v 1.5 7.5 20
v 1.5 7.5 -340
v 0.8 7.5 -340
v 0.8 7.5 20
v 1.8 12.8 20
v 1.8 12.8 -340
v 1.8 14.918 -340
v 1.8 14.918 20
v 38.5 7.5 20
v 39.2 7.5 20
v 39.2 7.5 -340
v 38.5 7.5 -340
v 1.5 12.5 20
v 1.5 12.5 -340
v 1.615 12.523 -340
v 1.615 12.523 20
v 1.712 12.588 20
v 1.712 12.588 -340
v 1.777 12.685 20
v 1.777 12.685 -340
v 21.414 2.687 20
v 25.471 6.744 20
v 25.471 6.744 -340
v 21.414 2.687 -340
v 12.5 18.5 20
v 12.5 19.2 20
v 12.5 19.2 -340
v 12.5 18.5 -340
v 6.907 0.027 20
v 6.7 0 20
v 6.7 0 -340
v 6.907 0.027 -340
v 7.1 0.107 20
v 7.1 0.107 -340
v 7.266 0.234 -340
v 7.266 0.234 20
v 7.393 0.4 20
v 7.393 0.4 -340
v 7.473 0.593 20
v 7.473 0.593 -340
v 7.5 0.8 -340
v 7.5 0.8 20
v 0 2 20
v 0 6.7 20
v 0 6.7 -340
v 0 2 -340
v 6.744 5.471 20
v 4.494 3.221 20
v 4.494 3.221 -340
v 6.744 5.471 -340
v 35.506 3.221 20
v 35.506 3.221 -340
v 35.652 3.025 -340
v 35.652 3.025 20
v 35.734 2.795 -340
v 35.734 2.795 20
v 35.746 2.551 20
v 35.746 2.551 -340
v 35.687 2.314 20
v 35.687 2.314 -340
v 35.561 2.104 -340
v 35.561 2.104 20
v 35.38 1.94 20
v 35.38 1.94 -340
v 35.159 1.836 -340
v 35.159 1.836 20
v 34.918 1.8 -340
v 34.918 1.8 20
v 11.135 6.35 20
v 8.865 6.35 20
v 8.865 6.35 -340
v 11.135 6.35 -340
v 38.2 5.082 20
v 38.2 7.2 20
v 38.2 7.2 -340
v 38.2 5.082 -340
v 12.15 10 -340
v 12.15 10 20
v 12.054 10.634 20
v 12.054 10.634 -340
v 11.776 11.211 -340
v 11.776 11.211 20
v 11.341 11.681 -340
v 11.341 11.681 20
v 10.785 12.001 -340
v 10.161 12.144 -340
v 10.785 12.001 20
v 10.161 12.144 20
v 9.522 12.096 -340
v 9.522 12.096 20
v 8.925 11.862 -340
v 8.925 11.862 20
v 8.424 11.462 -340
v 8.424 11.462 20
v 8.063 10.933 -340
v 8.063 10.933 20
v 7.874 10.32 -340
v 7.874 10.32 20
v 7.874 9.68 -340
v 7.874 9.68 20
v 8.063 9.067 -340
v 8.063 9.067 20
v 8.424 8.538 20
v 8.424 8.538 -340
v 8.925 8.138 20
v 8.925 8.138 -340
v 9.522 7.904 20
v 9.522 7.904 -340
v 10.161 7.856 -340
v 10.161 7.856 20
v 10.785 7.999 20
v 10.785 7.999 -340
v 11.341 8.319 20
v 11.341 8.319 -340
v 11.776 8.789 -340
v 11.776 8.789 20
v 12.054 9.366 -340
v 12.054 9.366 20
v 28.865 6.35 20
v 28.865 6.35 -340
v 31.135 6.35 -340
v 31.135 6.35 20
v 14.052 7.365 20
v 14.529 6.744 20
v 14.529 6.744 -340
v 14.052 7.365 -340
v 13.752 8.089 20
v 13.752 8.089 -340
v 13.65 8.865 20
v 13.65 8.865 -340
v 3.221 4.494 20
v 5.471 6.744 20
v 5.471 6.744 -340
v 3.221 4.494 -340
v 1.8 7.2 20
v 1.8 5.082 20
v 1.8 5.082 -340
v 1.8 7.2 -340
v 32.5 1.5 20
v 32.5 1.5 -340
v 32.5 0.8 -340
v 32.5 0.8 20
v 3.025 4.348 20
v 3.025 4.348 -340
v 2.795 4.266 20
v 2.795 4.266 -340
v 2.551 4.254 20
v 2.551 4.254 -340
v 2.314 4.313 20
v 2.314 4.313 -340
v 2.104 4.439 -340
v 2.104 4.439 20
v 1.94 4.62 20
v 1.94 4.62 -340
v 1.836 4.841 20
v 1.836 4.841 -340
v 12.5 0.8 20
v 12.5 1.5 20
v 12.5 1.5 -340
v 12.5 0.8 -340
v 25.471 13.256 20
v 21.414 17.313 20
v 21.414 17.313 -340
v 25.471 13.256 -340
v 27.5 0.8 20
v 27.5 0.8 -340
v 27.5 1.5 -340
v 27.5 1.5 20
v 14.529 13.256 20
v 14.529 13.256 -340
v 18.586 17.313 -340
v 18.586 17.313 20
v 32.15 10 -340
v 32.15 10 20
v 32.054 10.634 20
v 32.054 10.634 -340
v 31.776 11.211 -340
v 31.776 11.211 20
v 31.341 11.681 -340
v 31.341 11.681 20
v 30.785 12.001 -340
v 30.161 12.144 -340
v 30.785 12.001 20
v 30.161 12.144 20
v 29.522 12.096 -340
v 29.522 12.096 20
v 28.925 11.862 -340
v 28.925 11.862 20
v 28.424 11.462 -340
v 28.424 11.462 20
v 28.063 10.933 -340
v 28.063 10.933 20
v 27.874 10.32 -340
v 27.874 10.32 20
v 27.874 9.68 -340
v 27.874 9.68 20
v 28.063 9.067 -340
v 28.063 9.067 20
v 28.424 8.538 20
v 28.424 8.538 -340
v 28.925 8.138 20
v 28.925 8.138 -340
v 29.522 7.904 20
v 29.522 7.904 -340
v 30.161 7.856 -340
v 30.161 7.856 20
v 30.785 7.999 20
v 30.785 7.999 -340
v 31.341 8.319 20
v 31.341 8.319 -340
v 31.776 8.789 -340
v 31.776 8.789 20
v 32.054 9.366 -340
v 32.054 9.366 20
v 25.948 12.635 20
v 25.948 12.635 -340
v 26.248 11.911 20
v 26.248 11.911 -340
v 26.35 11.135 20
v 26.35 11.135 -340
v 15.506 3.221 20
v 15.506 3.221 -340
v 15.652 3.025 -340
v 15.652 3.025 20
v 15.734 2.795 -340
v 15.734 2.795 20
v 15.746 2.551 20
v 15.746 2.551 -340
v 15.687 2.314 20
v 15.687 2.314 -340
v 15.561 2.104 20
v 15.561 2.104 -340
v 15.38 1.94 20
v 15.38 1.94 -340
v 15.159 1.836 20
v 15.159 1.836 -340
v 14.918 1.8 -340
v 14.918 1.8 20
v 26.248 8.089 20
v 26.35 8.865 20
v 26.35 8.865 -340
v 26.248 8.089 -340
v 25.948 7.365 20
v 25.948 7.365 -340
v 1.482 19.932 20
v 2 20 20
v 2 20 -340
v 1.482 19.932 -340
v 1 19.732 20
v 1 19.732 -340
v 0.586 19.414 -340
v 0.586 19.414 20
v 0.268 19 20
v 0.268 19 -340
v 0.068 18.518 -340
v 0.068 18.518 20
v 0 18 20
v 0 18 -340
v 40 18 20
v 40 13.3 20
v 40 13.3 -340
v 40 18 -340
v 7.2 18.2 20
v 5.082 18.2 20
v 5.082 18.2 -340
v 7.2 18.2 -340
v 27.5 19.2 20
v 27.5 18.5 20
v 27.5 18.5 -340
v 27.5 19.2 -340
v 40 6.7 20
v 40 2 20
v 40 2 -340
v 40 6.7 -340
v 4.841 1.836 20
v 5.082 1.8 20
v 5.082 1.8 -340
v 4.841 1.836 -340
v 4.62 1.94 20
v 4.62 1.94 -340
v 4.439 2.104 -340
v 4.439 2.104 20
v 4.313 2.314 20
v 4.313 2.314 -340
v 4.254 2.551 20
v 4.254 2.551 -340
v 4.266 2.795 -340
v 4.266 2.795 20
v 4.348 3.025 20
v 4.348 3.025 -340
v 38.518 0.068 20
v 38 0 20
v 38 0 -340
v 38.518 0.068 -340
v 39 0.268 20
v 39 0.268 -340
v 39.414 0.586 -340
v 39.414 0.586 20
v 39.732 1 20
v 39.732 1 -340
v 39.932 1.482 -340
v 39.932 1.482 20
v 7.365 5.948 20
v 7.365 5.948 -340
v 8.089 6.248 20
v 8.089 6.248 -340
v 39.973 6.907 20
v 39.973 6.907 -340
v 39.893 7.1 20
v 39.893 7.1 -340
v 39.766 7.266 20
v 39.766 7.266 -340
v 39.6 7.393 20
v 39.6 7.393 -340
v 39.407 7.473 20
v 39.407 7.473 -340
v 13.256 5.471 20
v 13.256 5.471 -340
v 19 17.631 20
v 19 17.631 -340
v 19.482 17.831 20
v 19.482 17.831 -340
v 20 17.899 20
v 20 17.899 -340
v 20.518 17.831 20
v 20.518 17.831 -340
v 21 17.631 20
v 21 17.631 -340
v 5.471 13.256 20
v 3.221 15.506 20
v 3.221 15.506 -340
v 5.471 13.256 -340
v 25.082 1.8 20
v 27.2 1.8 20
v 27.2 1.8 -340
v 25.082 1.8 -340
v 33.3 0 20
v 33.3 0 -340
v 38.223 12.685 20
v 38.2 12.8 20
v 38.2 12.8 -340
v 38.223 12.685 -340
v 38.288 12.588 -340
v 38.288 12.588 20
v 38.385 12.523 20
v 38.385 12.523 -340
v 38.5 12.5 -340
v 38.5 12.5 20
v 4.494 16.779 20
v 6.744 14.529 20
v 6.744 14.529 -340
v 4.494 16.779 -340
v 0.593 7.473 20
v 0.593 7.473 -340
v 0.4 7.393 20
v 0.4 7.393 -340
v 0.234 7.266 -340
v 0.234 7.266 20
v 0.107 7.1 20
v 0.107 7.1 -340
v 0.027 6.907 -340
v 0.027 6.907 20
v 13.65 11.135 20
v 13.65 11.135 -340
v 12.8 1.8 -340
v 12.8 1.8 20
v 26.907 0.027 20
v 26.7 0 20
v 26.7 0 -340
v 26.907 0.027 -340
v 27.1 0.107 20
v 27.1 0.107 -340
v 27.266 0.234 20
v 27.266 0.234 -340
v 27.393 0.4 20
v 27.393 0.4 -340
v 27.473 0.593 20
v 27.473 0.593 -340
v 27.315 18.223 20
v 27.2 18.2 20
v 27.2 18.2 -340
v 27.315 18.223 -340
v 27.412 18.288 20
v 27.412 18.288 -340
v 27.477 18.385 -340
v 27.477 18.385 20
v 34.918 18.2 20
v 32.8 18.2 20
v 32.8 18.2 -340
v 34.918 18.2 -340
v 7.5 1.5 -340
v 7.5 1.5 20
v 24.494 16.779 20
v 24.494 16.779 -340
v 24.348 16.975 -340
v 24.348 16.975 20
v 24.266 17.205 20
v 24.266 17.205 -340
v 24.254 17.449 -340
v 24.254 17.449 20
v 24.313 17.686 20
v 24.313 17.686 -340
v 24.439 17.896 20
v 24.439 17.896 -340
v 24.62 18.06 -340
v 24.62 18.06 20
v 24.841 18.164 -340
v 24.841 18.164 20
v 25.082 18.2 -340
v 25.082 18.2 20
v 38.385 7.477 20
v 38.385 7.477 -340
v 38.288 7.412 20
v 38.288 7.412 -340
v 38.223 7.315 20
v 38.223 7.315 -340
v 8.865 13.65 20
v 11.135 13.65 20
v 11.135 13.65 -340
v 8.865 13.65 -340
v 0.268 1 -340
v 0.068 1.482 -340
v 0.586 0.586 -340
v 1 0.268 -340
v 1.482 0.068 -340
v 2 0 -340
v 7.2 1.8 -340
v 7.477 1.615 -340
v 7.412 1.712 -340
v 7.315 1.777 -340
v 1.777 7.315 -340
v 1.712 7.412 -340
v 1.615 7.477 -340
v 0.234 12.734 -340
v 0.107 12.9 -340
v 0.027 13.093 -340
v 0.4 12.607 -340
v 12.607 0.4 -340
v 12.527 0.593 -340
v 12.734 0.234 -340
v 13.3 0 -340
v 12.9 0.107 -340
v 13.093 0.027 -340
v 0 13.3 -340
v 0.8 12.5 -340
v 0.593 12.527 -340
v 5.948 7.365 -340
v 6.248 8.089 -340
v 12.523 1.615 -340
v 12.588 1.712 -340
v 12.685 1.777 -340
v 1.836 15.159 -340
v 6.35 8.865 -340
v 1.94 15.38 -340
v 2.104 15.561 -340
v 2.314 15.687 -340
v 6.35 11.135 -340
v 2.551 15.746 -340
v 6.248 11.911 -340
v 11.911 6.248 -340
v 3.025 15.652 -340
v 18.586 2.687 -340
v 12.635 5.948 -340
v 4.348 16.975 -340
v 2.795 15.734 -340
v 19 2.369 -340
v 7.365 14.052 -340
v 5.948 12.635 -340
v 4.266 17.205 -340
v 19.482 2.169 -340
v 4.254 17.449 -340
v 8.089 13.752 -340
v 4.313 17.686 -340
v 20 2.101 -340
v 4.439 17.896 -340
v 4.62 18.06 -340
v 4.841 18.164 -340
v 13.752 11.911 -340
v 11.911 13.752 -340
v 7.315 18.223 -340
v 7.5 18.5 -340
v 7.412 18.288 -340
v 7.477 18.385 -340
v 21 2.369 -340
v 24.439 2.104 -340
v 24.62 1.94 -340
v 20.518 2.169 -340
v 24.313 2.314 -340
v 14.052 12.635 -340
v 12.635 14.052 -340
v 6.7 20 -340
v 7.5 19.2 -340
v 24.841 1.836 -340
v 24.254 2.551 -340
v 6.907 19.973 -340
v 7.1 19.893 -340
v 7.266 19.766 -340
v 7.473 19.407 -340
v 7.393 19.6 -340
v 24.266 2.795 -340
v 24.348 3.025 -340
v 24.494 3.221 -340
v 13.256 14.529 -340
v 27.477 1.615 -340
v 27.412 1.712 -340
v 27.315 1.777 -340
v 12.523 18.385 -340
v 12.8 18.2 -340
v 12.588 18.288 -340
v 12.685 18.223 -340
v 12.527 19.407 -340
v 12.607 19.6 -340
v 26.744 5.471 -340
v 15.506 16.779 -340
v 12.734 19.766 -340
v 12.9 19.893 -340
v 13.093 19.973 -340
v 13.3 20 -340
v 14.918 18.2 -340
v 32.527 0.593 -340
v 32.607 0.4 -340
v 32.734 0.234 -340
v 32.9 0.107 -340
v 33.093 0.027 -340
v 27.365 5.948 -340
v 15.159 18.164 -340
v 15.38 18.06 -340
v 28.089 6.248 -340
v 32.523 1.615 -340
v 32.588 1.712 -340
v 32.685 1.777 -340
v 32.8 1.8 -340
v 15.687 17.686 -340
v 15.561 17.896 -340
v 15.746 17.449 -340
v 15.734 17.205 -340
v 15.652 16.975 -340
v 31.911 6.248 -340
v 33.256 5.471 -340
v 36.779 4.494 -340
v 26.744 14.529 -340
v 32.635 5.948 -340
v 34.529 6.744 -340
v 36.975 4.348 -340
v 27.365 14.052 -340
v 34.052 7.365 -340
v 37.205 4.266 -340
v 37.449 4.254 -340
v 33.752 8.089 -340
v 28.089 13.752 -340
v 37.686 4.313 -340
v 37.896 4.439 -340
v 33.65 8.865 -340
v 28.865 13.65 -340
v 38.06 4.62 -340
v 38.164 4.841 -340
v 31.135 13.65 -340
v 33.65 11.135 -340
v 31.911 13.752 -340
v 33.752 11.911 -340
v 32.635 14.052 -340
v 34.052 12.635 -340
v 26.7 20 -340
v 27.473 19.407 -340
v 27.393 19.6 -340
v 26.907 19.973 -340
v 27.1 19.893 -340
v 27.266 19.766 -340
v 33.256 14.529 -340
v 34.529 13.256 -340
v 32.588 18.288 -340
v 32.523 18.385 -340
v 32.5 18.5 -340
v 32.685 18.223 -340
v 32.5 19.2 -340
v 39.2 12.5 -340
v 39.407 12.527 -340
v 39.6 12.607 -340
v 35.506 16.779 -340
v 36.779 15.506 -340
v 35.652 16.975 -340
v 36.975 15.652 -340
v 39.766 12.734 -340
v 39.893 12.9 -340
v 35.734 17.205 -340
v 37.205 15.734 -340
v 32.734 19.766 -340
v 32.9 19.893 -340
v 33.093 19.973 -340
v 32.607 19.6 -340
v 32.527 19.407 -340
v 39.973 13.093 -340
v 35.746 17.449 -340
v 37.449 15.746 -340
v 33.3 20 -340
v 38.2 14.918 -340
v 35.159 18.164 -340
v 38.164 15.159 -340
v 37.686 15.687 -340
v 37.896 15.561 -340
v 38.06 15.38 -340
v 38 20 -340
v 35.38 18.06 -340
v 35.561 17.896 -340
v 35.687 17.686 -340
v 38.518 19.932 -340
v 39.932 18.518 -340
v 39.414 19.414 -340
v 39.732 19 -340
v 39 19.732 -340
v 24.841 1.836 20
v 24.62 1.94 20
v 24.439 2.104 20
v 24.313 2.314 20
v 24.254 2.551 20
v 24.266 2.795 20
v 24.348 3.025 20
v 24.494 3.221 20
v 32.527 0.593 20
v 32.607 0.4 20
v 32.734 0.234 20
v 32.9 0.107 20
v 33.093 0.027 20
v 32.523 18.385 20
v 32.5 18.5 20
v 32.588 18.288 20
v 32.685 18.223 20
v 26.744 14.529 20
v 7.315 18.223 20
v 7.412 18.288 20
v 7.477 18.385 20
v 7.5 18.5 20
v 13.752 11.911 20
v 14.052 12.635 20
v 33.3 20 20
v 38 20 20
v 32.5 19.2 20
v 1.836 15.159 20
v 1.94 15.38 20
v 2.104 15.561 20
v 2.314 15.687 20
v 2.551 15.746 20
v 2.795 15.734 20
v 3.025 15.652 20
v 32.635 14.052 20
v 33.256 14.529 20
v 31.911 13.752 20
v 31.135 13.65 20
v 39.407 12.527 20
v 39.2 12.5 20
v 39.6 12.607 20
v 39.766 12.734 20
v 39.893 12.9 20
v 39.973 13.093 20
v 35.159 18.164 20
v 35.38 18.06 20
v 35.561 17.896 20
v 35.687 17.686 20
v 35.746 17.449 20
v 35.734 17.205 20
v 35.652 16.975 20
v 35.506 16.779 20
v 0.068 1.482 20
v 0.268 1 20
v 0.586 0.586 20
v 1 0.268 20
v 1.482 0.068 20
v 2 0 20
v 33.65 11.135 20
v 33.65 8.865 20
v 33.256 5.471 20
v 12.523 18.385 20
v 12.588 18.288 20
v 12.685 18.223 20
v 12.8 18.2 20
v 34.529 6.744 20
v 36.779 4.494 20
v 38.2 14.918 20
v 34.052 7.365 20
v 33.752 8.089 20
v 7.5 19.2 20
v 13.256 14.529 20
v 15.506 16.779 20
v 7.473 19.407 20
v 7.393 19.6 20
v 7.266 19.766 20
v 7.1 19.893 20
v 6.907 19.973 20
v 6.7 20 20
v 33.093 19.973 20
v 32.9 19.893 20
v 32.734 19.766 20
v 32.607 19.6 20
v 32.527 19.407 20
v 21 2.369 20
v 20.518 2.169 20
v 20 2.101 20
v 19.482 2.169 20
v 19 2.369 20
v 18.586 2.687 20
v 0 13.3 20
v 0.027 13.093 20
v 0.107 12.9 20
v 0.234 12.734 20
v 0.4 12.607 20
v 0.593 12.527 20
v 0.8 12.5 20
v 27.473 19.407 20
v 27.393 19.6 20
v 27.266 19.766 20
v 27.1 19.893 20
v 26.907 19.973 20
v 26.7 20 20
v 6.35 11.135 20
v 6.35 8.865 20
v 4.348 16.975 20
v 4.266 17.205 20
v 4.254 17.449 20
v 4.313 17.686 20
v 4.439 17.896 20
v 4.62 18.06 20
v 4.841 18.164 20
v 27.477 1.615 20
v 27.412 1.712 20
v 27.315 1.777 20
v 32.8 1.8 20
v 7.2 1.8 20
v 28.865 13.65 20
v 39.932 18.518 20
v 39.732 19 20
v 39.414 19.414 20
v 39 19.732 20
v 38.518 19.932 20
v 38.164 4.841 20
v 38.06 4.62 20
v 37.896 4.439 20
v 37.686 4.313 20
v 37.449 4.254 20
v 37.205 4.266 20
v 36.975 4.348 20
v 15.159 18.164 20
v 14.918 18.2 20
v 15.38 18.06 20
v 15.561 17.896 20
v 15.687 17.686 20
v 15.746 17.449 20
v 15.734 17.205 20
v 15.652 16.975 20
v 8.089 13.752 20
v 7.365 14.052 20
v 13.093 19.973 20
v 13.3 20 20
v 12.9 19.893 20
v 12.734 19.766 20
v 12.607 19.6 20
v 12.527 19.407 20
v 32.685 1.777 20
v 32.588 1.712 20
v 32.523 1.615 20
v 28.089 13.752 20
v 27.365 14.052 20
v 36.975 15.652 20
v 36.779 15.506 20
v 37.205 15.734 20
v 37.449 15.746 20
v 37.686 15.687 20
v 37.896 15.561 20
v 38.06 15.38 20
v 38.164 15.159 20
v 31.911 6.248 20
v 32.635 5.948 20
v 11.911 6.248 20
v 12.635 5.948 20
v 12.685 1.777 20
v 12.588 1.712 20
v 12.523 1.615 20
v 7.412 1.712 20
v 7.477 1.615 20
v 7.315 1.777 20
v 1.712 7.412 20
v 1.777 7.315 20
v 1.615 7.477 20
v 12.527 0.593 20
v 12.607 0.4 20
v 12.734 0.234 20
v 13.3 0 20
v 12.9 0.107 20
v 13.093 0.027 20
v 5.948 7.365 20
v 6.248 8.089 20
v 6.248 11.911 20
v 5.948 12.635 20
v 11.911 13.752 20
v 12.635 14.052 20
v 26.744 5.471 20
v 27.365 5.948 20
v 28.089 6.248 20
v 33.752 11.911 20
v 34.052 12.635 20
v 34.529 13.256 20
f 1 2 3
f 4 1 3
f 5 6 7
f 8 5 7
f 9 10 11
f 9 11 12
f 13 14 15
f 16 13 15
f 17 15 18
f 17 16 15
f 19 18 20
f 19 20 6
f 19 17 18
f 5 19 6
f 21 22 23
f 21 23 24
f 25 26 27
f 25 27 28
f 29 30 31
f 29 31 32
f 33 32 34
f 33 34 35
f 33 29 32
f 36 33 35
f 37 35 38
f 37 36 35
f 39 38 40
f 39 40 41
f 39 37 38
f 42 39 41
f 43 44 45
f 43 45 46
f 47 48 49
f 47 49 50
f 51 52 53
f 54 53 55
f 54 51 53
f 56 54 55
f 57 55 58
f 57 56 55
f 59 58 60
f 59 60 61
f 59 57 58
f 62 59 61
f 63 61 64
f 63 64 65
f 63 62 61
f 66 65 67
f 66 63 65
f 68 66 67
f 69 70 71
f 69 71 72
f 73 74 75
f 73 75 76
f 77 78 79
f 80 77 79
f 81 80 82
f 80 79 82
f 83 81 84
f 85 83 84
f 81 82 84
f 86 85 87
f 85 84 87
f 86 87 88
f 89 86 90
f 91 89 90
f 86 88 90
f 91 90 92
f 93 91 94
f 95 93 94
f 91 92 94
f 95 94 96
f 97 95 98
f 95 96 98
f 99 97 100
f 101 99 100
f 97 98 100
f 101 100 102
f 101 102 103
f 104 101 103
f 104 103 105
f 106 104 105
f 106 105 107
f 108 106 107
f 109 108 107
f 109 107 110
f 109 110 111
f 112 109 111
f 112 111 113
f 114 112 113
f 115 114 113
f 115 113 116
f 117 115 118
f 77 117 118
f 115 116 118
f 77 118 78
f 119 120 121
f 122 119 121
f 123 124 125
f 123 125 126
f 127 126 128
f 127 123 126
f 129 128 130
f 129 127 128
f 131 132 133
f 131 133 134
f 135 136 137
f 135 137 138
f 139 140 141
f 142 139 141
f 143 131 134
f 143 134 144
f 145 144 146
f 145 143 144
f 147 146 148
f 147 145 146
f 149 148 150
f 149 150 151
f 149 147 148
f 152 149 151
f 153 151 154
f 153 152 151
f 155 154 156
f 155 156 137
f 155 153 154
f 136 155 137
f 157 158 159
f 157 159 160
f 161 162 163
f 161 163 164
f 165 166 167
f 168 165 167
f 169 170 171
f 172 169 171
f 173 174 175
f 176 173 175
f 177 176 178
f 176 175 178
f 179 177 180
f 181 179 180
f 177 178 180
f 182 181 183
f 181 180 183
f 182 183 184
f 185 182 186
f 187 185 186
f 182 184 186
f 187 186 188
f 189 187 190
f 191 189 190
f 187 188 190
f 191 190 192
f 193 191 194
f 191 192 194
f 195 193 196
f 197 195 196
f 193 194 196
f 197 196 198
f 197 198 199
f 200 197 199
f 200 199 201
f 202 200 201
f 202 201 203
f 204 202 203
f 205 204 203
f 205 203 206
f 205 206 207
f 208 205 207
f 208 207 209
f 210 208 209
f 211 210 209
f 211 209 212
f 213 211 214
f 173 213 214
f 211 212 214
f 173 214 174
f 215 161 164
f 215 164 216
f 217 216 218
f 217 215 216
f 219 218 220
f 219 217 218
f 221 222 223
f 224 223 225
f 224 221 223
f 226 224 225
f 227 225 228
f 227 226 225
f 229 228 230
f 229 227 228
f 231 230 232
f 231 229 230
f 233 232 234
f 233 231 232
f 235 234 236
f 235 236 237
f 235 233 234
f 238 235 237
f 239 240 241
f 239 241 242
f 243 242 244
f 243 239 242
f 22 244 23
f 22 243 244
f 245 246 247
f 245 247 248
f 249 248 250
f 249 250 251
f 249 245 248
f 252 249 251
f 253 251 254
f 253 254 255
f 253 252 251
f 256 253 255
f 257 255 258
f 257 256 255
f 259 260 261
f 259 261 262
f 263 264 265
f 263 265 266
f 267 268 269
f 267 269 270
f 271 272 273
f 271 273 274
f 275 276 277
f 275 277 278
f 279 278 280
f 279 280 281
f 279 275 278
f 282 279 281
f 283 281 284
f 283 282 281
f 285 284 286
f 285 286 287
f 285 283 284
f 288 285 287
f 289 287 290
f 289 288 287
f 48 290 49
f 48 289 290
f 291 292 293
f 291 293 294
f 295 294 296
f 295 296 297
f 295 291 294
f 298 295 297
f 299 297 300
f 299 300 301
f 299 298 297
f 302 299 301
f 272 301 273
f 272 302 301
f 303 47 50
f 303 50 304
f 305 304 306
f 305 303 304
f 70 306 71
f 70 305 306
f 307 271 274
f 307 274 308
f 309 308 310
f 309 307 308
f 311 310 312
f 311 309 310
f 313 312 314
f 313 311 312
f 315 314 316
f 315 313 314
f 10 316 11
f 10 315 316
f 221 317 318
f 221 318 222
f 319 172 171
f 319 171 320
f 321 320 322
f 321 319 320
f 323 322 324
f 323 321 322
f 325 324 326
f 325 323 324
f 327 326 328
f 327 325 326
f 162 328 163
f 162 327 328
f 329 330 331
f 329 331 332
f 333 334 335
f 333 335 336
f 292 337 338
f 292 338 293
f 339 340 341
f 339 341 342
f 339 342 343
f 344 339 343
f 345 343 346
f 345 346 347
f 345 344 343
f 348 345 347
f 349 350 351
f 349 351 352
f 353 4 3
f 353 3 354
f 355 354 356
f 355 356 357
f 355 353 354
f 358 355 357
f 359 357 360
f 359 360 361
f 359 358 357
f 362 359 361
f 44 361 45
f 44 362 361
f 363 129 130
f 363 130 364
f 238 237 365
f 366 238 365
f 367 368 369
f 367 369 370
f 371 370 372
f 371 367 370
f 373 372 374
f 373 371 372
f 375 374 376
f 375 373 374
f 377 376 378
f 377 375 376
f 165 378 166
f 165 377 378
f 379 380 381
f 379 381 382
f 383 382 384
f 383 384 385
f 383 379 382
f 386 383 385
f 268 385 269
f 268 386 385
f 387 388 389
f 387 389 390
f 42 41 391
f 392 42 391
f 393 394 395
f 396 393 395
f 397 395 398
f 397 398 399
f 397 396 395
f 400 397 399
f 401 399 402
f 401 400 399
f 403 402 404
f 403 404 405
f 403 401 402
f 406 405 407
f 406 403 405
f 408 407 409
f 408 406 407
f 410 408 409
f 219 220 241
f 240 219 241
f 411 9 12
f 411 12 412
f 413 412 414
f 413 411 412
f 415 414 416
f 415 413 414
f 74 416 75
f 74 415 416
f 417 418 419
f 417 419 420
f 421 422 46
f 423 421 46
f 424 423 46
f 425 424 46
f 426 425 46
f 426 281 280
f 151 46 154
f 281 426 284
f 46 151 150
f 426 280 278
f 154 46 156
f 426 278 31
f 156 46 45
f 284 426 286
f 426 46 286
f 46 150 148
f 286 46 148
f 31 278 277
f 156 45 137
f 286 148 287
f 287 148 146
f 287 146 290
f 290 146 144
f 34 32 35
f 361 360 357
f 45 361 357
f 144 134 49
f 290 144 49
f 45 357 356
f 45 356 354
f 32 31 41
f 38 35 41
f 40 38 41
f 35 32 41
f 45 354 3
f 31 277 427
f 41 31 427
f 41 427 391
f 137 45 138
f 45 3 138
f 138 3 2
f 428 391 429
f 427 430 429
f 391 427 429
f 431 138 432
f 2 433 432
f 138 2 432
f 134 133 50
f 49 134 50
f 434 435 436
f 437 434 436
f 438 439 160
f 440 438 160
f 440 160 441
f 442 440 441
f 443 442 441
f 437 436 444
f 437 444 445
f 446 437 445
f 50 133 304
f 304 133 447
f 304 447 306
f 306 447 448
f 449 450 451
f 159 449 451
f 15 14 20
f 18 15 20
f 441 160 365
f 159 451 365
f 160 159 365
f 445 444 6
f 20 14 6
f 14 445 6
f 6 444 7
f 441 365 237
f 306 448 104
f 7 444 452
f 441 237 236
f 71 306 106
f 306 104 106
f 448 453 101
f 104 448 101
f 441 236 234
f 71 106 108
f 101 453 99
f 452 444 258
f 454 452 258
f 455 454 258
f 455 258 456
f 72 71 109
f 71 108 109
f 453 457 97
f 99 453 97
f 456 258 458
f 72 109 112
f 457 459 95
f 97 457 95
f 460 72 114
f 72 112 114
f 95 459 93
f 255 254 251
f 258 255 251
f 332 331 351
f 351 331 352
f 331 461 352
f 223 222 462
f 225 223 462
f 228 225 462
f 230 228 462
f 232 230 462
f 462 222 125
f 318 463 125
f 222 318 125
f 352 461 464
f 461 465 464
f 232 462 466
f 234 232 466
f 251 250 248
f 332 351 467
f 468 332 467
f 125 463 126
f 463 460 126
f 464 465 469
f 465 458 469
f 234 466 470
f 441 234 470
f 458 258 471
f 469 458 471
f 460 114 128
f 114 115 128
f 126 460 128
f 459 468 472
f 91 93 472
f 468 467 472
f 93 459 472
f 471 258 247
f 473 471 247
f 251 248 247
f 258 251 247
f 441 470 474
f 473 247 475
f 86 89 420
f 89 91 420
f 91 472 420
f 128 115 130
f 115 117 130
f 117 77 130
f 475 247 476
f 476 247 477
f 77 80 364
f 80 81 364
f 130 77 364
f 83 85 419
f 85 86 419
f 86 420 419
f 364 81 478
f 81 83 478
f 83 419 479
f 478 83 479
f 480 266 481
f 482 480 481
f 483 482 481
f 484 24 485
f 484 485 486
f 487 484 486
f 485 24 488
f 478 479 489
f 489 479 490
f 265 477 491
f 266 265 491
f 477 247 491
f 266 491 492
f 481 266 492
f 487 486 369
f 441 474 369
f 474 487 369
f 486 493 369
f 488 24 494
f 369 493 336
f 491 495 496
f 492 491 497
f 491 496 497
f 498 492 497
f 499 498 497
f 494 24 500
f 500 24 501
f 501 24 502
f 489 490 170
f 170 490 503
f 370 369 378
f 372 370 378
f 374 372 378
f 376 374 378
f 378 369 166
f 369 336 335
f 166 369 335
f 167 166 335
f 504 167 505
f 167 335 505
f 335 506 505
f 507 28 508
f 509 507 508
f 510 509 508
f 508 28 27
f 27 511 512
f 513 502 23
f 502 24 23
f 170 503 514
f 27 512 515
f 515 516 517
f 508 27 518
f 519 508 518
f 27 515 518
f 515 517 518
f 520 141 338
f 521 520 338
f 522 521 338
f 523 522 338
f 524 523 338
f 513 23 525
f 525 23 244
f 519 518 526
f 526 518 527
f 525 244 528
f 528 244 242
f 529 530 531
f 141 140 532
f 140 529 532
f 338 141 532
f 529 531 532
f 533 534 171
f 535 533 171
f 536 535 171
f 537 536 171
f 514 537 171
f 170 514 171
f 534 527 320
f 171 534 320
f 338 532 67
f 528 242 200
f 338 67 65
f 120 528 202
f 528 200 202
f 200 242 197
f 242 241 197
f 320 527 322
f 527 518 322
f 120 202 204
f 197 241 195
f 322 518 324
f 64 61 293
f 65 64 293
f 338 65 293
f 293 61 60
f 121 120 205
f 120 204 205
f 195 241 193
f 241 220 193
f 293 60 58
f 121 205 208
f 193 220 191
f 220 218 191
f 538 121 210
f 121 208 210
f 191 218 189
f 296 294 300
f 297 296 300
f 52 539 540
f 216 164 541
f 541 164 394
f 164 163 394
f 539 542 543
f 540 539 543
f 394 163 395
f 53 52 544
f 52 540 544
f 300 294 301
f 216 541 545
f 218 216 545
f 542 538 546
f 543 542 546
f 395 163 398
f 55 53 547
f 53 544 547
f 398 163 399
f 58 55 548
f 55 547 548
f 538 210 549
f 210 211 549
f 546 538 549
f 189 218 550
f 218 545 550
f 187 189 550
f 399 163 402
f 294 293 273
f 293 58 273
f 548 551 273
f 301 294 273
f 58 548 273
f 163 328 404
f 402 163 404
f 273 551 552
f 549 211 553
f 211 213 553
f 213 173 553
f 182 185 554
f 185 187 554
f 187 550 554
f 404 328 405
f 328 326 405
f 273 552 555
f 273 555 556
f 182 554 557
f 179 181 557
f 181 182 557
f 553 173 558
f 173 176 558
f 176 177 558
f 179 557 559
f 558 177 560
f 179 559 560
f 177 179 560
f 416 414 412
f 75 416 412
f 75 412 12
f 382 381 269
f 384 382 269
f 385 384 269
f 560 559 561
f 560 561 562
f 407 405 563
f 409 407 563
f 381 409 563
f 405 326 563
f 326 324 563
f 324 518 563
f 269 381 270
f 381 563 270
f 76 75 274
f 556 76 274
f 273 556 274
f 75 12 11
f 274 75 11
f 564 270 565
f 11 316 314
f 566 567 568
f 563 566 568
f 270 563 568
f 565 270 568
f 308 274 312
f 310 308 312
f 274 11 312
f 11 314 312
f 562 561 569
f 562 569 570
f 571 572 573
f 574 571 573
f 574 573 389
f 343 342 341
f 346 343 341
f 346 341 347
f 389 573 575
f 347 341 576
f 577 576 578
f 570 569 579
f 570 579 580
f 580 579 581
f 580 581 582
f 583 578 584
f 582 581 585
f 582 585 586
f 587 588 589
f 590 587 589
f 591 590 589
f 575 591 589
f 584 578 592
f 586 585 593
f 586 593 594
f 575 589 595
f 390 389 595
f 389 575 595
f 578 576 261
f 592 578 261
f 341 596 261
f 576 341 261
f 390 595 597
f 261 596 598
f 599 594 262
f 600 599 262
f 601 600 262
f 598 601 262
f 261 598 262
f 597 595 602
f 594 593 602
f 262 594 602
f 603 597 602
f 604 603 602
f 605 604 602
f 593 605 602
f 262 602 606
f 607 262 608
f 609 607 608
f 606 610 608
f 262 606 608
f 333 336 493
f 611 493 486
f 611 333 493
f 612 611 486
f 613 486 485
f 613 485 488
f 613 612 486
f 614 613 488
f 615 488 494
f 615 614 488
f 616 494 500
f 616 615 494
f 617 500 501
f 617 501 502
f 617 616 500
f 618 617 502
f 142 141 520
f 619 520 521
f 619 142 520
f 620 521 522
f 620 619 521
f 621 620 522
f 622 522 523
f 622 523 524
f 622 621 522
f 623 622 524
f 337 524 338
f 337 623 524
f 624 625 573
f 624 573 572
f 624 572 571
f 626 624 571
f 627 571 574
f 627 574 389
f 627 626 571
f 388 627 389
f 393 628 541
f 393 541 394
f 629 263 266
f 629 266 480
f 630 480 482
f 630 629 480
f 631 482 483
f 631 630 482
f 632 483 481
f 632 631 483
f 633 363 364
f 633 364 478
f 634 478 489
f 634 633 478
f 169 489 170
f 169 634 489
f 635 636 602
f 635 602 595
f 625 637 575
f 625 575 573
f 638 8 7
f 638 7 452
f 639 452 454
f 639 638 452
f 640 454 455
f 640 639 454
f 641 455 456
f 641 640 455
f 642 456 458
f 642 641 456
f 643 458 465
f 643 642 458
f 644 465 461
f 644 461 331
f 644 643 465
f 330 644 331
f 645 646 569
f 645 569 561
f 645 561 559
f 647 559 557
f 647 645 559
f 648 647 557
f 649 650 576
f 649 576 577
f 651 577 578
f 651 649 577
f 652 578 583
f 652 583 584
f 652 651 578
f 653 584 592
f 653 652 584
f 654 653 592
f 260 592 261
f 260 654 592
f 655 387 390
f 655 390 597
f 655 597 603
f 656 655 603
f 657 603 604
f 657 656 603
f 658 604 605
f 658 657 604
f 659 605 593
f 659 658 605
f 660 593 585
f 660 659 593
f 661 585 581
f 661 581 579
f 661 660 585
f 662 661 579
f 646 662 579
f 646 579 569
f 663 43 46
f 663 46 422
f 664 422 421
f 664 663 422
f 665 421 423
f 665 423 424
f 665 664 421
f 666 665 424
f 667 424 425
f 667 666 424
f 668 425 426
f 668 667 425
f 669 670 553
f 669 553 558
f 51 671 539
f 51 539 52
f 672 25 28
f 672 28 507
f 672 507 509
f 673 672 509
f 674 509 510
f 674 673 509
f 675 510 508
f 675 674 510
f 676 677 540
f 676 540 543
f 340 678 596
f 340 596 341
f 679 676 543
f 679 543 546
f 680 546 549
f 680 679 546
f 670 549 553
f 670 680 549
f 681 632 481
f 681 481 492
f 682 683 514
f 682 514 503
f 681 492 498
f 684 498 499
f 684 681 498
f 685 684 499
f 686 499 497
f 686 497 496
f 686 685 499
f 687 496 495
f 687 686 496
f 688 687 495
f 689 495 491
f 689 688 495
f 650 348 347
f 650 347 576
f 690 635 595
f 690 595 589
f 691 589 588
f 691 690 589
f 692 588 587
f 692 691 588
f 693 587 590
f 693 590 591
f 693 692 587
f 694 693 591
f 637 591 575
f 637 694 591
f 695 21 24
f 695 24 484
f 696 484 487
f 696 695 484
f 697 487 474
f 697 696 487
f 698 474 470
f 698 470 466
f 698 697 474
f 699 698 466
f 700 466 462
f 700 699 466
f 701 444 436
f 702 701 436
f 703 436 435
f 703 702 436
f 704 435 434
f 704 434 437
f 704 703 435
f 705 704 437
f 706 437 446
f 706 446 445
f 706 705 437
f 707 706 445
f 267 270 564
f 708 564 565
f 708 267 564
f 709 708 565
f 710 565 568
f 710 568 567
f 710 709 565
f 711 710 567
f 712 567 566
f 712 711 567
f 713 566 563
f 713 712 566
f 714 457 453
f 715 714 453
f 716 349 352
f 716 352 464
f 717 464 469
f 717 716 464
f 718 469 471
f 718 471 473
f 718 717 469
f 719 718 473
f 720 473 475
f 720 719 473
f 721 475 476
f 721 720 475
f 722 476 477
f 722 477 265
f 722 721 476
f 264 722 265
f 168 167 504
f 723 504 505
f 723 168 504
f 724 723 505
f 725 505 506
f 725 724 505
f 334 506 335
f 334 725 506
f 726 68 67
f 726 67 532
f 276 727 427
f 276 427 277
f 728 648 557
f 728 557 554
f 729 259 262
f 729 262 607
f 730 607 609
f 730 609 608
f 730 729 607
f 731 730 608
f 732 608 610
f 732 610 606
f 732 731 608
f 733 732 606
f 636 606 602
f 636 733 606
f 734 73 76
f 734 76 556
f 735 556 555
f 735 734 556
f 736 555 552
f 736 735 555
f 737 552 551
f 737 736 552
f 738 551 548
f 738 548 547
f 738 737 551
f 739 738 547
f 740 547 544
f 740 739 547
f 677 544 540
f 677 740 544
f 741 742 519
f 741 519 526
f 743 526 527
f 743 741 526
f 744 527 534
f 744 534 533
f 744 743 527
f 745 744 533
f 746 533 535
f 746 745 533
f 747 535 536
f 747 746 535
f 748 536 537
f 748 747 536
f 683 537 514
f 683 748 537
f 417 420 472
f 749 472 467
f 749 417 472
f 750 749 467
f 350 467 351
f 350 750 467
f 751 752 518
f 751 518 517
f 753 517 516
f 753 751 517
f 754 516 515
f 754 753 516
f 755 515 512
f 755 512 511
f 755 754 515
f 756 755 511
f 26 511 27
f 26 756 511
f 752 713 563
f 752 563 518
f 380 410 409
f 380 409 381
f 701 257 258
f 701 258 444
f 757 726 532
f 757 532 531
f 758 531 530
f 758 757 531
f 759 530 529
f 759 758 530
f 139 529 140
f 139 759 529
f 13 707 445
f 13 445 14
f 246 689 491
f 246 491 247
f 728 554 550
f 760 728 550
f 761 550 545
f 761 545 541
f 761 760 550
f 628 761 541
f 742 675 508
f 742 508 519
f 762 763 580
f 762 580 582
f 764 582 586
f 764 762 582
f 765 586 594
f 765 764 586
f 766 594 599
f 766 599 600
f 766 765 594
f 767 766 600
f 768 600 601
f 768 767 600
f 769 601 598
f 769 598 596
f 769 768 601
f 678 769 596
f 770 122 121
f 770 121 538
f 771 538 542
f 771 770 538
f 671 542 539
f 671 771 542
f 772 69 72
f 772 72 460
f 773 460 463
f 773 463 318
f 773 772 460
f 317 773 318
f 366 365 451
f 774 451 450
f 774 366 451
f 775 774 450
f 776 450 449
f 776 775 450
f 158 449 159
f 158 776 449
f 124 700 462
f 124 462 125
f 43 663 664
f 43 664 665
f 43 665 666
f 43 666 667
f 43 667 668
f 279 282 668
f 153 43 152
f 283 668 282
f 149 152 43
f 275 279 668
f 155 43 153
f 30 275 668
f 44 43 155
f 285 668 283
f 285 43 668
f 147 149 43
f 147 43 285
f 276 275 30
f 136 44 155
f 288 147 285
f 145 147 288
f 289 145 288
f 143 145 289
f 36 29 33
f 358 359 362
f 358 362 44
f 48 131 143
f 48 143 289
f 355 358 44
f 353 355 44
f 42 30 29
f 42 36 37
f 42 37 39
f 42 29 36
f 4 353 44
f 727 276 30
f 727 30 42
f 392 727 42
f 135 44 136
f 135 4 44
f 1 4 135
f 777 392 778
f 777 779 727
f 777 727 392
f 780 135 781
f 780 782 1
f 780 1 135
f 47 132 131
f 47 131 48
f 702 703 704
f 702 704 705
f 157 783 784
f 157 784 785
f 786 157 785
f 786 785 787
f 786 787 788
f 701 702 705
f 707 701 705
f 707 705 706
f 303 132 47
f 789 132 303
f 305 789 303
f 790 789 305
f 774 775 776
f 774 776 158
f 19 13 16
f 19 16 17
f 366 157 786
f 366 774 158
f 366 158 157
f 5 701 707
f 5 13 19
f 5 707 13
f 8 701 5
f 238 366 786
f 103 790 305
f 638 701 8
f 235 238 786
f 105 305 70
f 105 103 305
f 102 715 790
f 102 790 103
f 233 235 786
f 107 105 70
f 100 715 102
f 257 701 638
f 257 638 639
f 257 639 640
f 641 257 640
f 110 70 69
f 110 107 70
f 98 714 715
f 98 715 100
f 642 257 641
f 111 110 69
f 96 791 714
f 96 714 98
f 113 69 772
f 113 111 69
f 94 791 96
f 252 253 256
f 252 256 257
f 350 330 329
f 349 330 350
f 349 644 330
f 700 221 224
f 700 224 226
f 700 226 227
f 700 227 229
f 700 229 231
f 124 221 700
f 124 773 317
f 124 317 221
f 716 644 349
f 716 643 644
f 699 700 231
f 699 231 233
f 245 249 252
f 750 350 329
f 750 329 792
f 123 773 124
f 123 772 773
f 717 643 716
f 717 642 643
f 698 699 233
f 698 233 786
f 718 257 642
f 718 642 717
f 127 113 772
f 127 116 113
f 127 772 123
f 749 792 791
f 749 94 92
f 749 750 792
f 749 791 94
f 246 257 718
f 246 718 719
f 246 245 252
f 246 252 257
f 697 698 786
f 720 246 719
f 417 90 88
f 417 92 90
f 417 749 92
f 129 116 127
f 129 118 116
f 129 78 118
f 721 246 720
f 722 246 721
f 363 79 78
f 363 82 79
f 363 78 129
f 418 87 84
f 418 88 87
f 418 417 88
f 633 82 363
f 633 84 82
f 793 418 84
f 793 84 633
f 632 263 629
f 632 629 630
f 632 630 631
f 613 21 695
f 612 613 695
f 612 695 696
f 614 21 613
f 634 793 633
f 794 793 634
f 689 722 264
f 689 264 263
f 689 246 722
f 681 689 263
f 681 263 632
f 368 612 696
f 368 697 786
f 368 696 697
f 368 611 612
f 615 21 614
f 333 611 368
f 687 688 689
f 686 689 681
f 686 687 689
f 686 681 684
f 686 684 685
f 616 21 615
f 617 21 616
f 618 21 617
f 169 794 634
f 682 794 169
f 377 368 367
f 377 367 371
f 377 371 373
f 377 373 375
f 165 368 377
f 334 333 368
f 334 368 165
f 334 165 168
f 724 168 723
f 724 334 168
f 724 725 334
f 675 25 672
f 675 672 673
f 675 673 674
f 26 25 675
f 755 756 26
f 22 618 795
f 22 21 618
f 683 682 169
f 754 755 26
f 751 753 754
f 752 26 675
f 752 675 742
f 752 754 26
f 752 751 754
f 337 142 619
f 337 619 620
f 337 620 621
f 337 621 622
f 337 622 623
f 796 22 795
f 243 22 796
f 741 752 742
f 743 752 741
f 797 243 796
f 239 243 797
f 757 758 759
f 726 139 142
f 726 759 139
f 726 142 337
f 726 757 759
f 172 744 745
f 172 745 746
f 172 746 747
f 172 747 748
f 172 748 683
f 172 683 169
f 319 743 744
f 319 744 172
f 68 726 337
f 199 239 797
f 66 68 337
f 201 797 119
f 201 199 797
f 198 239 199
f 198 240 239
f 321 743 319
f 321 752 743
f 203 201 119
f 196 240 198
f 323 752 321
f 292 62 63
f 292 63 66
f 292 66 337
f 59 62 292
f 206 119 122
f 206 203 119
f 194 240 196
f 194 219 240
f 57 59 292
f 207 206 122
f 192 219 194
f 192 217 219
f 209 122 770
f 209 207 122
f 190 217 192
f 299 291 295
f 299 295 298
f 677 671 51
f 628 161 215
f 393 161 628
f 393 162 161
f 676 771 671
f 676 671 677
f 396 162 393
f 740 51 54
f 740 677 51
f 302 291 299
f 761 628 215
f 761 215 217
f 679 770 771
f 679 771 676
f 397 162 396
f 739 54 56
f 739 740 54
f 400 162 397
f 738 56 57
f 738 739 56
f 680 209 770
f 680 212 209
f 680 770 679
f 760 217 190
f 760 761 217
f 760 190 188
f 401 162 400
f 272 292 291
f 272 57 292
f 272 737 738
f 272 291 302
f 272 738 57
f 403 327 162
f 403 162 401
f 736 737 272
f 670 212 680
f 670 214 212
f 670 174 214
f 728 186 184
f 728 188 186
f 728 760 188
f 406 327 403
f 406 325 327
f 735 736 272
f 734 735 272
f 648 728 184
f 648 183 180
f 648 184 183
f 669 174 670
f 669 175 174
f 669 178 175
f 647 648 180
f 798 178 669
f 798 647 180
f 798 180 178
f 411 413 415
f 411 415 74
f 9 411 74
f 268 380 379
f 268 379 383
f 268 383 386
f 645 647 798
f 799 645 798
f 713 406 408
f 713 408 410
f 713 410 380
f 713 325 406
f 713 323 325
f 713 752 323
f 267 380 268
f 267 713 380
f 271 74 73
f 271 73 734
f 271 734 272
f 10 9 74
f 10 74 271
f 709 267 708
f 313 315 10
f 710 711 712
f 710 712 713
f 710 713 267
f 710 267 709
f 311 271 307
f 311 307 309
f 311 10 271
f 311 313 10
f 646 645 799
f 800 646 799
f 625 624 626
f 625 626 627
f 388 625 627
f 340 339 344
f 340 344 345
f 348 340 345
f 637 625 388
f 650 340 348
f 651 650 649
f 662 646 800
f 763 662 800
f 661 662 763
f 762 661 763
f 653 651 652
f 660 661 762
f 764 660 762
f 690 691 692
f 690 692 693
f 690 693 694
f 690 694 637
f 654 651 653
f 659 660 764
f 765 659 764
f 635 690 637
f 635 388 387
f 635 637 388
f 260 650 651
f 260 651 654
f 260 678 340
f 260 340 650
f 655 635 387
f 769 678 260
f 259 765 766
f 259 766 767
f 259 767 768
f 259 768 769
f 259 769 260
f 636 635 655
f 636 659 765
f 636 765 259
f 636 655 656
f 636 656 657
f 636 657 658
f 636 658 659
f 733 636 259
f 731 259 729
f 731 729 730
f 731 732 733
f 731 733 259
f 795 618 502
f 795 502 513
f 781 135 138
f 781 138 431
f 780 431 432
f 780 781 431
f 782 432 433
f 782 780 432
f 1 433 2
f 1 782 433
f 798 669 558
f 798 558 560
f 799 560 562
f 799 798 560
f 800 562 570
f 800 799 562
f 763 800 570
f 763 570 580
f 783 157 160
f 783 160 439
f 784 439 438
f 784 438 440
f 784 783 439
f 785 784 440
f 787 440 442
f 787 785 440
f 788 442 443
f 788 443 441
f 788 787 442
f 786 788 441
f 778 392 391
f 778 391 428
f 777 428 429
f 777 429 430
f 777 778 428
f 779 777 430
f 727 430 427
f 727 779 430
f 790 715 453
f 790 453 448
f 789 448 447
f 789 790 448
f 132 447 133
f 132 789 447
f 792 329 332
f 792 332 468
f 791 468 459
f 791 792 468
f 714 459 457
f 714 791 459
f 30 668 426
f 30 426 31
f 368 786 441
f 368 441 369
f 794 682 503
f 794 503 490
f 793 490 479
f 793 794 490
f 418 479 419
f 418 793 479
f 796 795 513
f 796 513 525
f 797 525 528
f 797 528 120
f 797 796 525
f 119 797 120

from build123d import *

# Parameters (mm, degrees)
CROQUIS1_R              = 2.15
SALIENTE_EXTRUIR1_DEPTH = 360


with BuildPart() as part:
    # Croquis1 → Saliente-Extruir1 (new body)
    with BuildSketch(Plane.XY.offset(20)):
        with BuildLine():
            Line((32.499999987, 1.499999997), (32.499999987, 0.800000002))
            ThreePointArc((32.499999987, 0.800000002), (32.734314563, 0.234314576), (33.29999999, 0))
            Line((33.29999999, 0), (38, 0))
            ThreePointArc((38, 0), (39.414213562, 0.585786438), (40, 2))
            Line((40, 2), (40, 6.700000003))
            ThreePointArc((40, 6.700000003), (39.765685425, 7.265685427), (39.2, 7.500000003))
            Line((39.2, 7.500000003), (38.499999996, 7.500000003))
            ThreePointArc((38.499999996, 7.500000003), (38.287867962, 7.412132037), (38.199999996, 7.200000003))
            Line((38.199999996, 7.200000003), (38.199999996, 5.082411612))
            ThreePointArc((38.199999996, 5.082411612), (37.686138518, 4.313363563), (36.778984492, 4.493807718))
            Line((36.778984492, 4.493807718), (34.528679652, 6.744112558))
            ThreePointArc((34.528679652, 6.744112558), (33.878361399, 7.717382603), (33.649999997, 8.865432898))
            Line((33.649999997, 8.865432898), (33.649999997, 11.134567109))
            ThreePointArc((33.649999997, 11.134567109), (33.878361399, 12.282617405), (34.528679653, 13.255887451))
            Line((34.528679653, 13.255887451), (36.778984498, 15.506192296))
            ThreePointArc((36.778984498, 15.506192296), (37.68613852, 15.686636451), (38.199999996, 14.917588405))
            Line((38.199999996, 14.917588405), (38.199999996, 12.800000003))
            ThreePointArc((38.199999996, 12.800000003), (38.287867963, 12.587867967), (38.499999999, 12.5))
            Line((38.499999999, 12.5), (39.199999998, 12.5))
            ThreePointArc((39.199999998, 12.5), (39.765685424, 12.734314576), (40, 13.300000002))
            Line((40, 13.300000002), (40, 18))
            ThreePointArc((40, 18), (39.414213562, 19.414213562), (38, 20))
            Line((38, 20), (33.299999987, 20))
            ThreePointArc((33.299999987, 20), (32.734314562, 19.765685425), (32.499999987, 19.2))
            Line((32.499999987, 19.2), (32.499999987, 18.499999997))
            ThreePointArc((32.499999987, 18.499999997), (32.587867953, 18.287867963), (32.799999987, 18.199999997))
            Line((32.799999987, 18.199999997), (34.917587986, 18.199999997))
            ThreePointArc((34.917587986, 18.199999997), (35.686635927, 17.686138592), (35.506191797, 16.778984693))
            Line((35.506191797, 16.778984693), (33.255886766, 14.528679662))
            ThreePointArc((33.255886766, 14.528679662), (32.282616721, 13.878361409), (31.134566426, 13.650000007))
            Line((31.134566426, 13.650000007), (28.86543289, 13.650000007))
            ThreePointArc((28.86543289, 13.650000007), (27.717382593, 13.878361409), (26.744112547, 14.528679663))
            Line((26.744112547, 14.528679663), (24.493807707, 16.778984503))
            ThreePointArc((24.493807707, 16.778984503), (24.313363553, 17.686138523), (25.082411597, 18.199999997))
            Line((25.082411597, 18.199999997), (27.199999997, 18.199999997))
            ThreePointArc((27.199999997, 18.199999997), (27.412132033, 18.287867964), (27.5, 18.5))
            Line((27.5, 18.5), (27.5, 19.199999998))
            ThreePointArc((27.5, 19.199999998), (27.265685424, 19.765685424), (26.699999997, 20))
            Line((26.699999997, 20), (13.299999987, 20))
            ThreePointArc((13.299999987, 20), (12.734314562, 19.765685425), (12.499999987, 19.2))
            Line((12.499999987, 19.2), (12.499999987, 18.499999997))
            ThreePointArc((12.499999987, 18.499999997), (12.587867953, 18.287867963), (12.799999987, 18.199999997))
            Line((12.799999987, 18.199999997), (14.917588389, 18.199999997))
            ThreePointArc((14.917588389, 18.199999997), (15.686636438, 17.686138519), (15.506192283, 16.778984493))
            Line((15.506192283, 16.778984493), (13.255887452, 14.528679662))
            ThreePointArc((13.255887452, 14.528679662), (12.282617407, 13.878361409), (11.134567112, 13.650000007))
            Line((11.134567112, 13.650000007), (8.86543289, 13.650000007))
            ThreePointArc((8.86543289, 13.650000007), (7.717382593, 13.878361409), (6.744112547, 14.528679663))
            Line((6.744112547, 14.528679663), (4.493807707, 16.778984503))
            ThreePointArc((4.493807707, 16.778984503), (4.313363553, 17.686138523), (5.082411597, 18.199999997))
            Line((5.082411597, 18.199999997), (7.199999997, 18.199999997))
            ThreePointArc((7.199999997, 18.199999997), (7.412132033, 18.287867964), (7.5, 18.5))
            Line((7.5, 18.5), (7.5, 19.199999998))
            ThreePointArc((7.5, 19.199999998), (7.265685424, 19.765685424), (6.699999997, 20))
            Line((6.699999997, 20), (2, 20))
            ThreePointArc((2, 20), (0.585786438, 19.414213562), (0, 18))
            Line((0, 18), (0, 13.3))
            ThreePointArc((0, 13.3), (0.234314575, 12.734314575), (0.8, 12.5))
            Line((0.8, 12.5), (1.500000005, 12.5))
            ThreePointArc((1.500000005, 12.5), (1.71213204, 12.587867966), (1.800000005, 12.8))
            Line((1.800000005, 12.8), (1.800000005, 14.91758839))
            ThreePointArc((1.800000005, 14.91758839), (2.313861483, 15.686636439), (3.22101551, 15.506192284))
            Line((3.22101551, 15.506192284), (5.471320341, 13.255887453))
            ThreePointArc((5.471320341, 13.255887453), (6.121638594, 12.282617408), (6.349999996, 11.134567113))
            Line((6.349999996, 11.134567113), (6.349999996, 8.865432892))
            ThreePointArc((6.349999996, 8.865432892), (6.121638593, 7.717382596), (5.47132034, 6.74411255))
            Line((5.47132034, 6.74411255), (3.2210155, 4.49380771))
            ThreePointArc((3.2210155, 4.49380771), (2.31386148, 4.313363556), (1.800000005, 5.0824116))
            Line((1.800000005, 5.0824116), (1.800000005, 7.2))
            ThreePointArc((1.800000005, 7.2), (1.712132039, 7.412132036), (1.500000003, 7.500000003))
            Line((1.500000003, 7.500000003), (0.800000003, 7.500000003))
            ThreePointArc((0.800000003, 7.500000003), (0.234314576, 7.265685427), (0, 6.7))
            Line((0, 6.7), (0, 2))
            ThreePointArc((0, 2), (0.585786438, 0.585786438), (2, 0))
            Line((2, 0), (6.7, 0))
            ThreePointArc((6.7, 0), (7.265685425, 0.234314575), (7.5, 0.8))
            Line((7.5, 0.8), (7.5, 1.5))
            ThreePointArc((7.5, 1.5), (7.412132034, 1.712132034), (7.2, 1.8))
            Line((7.2, 1.8), (5.0824116, 1.8))
            ThreePointArc((5.0824116, 1.8), (4.313363551, 2.313861478), (4.493807706, 3.221015504))
            Line((4.493807706, 3.221015504), (6.744112546, 5.471320344))
            ThreePointArc((6.744112546, 5.471320344), (7.717382591, 6.121638597), (8.865432886, 6.349999999))
            Line((8.865432886, 6.349999999), (11.134567108, 6.349999999))
            ThreePointArc((11.134567108, 6.349999999), (12.282617404, 6.121638597), (13.25588745, 5.471320343))
            Line((13.25588745, 5.471320343), (15.506192295, 3.221015498))
            ThreePointArc((15.506192295, 3.221015498), (15.686636449, 2.313861476), (14.917588403, 1.8))
            Line((14.917588403, 1.8), (12.79999999, 1.8))
            ThreePointArc((12.79999999, 1.8), (12.587867954, 1.712132033), (12.499999987, 1.499999997))
            Line((12.499999987, 1.499999997), (12.499999987, 0.800000003))
            ThreePointArc((12.499999987, 0.800000003), (12.734314563, 0.234314576), (13.29999999, 0))
            Line((13.29999999, 0), (26.7, 0))
            ThreePointArc((26.7, 0), (27.265685425, 0.234314575), (27.5, 0.8))
            Line((27.5, 0.8), (27.5, 1.5))
            ThreePointArc((27.5, 1.5), (27.412132034, 1.712132034), (27.2, 1.8))
            Line((27.2, 1.8), (25.0824116, 1.8))
            ThreePointArc((25.0824116, 1.8), (24.313363551, 2.313861478), (24.493807706, 3.221015504))
            Line((24.493807706, 3.221015504), (26.744112546, 5.471320344))
            ThreePointArc((26.744112546, 5.471320344), (27.717382591, 6.121638597), (28.865432886, 6.349999999))
            Line((28.865432886, 6.349999999), (31.134567114, 6.349999999))
            ThreePointArc((31.134567114, 6.349999999), (32.282617411, 6.121638597), (33.255887457, 5.471320343))
            Line((33.255887457, 5.471320343), (35.506192392, 3.221015408))
            ThreePointArc((35.506192392, 3.221015408), (35.686636535, 2.313861443), (34.917588538, 1.8))
            Line((34.917588538, 1.8), (32.79999999, 1.8))
            ThreePointArc((32.79999999, 1.8), (32.587867954, 1.712132033), (32.499999987, 1.499999997))
        make_face()
        with Locations((10, 10)):
            Circle(CROQUIS1_R, mode=Mode.SUBTRACT)
        with Locations((30, 10)):
            Circle(CROQUIS1_R, mode=Mode.SUBTRACT)
        with BuildLine():
            Line((18.585786097, 2.687006113), (14.528679097, 6.744113113))
            ThreePointArc((14.528679097, 6.744113113), (13.878360843, 7.717383159), (13.649999441, 8.865433456))
            Line((13.649999441, 8.865433456), (13.649999441, 11.134566554))
            ThreePointArc((13.649999441, 11.134566554), (13.878360843, 12.282616849), (14.528679096, 13.255886895))
            Line((14.528679096, 13.255886895), (18.585786441, 17.312994239))
            ThreePointArc((18.585786441, 17.312994239), (20.000000001, 17.898780676), (21.414213561, 17.312994239))
            Line((21.414213561, 17.312994239), (25.471320216, 13.255887584))
            ThreePointArc((25.471320216, 13.255887584), (26.12163847, 12.282617538), (26.349999872, 11.13456724))
            Line((26.349999872, 11.13456724), (26.349999872, 8.865433454))
            ThreePointArc((26.349999872, 8.865433454), (26.12163847, 7.717383158), (25.471320217, 6.744113113))
            Line((25.471320217, 6.744113113), (21.414213217, 2.687006113))
            ThreePointArc((21.414213217, 2.687006113), (19.999999657, 2.101219676), (18.585786097, 2.687006113))
        make_face(mode=Mode.SUBTRACT)
    extrude(amount=-SALIENTE_EXTRUIR1_DEPTH)


solid = part.part
